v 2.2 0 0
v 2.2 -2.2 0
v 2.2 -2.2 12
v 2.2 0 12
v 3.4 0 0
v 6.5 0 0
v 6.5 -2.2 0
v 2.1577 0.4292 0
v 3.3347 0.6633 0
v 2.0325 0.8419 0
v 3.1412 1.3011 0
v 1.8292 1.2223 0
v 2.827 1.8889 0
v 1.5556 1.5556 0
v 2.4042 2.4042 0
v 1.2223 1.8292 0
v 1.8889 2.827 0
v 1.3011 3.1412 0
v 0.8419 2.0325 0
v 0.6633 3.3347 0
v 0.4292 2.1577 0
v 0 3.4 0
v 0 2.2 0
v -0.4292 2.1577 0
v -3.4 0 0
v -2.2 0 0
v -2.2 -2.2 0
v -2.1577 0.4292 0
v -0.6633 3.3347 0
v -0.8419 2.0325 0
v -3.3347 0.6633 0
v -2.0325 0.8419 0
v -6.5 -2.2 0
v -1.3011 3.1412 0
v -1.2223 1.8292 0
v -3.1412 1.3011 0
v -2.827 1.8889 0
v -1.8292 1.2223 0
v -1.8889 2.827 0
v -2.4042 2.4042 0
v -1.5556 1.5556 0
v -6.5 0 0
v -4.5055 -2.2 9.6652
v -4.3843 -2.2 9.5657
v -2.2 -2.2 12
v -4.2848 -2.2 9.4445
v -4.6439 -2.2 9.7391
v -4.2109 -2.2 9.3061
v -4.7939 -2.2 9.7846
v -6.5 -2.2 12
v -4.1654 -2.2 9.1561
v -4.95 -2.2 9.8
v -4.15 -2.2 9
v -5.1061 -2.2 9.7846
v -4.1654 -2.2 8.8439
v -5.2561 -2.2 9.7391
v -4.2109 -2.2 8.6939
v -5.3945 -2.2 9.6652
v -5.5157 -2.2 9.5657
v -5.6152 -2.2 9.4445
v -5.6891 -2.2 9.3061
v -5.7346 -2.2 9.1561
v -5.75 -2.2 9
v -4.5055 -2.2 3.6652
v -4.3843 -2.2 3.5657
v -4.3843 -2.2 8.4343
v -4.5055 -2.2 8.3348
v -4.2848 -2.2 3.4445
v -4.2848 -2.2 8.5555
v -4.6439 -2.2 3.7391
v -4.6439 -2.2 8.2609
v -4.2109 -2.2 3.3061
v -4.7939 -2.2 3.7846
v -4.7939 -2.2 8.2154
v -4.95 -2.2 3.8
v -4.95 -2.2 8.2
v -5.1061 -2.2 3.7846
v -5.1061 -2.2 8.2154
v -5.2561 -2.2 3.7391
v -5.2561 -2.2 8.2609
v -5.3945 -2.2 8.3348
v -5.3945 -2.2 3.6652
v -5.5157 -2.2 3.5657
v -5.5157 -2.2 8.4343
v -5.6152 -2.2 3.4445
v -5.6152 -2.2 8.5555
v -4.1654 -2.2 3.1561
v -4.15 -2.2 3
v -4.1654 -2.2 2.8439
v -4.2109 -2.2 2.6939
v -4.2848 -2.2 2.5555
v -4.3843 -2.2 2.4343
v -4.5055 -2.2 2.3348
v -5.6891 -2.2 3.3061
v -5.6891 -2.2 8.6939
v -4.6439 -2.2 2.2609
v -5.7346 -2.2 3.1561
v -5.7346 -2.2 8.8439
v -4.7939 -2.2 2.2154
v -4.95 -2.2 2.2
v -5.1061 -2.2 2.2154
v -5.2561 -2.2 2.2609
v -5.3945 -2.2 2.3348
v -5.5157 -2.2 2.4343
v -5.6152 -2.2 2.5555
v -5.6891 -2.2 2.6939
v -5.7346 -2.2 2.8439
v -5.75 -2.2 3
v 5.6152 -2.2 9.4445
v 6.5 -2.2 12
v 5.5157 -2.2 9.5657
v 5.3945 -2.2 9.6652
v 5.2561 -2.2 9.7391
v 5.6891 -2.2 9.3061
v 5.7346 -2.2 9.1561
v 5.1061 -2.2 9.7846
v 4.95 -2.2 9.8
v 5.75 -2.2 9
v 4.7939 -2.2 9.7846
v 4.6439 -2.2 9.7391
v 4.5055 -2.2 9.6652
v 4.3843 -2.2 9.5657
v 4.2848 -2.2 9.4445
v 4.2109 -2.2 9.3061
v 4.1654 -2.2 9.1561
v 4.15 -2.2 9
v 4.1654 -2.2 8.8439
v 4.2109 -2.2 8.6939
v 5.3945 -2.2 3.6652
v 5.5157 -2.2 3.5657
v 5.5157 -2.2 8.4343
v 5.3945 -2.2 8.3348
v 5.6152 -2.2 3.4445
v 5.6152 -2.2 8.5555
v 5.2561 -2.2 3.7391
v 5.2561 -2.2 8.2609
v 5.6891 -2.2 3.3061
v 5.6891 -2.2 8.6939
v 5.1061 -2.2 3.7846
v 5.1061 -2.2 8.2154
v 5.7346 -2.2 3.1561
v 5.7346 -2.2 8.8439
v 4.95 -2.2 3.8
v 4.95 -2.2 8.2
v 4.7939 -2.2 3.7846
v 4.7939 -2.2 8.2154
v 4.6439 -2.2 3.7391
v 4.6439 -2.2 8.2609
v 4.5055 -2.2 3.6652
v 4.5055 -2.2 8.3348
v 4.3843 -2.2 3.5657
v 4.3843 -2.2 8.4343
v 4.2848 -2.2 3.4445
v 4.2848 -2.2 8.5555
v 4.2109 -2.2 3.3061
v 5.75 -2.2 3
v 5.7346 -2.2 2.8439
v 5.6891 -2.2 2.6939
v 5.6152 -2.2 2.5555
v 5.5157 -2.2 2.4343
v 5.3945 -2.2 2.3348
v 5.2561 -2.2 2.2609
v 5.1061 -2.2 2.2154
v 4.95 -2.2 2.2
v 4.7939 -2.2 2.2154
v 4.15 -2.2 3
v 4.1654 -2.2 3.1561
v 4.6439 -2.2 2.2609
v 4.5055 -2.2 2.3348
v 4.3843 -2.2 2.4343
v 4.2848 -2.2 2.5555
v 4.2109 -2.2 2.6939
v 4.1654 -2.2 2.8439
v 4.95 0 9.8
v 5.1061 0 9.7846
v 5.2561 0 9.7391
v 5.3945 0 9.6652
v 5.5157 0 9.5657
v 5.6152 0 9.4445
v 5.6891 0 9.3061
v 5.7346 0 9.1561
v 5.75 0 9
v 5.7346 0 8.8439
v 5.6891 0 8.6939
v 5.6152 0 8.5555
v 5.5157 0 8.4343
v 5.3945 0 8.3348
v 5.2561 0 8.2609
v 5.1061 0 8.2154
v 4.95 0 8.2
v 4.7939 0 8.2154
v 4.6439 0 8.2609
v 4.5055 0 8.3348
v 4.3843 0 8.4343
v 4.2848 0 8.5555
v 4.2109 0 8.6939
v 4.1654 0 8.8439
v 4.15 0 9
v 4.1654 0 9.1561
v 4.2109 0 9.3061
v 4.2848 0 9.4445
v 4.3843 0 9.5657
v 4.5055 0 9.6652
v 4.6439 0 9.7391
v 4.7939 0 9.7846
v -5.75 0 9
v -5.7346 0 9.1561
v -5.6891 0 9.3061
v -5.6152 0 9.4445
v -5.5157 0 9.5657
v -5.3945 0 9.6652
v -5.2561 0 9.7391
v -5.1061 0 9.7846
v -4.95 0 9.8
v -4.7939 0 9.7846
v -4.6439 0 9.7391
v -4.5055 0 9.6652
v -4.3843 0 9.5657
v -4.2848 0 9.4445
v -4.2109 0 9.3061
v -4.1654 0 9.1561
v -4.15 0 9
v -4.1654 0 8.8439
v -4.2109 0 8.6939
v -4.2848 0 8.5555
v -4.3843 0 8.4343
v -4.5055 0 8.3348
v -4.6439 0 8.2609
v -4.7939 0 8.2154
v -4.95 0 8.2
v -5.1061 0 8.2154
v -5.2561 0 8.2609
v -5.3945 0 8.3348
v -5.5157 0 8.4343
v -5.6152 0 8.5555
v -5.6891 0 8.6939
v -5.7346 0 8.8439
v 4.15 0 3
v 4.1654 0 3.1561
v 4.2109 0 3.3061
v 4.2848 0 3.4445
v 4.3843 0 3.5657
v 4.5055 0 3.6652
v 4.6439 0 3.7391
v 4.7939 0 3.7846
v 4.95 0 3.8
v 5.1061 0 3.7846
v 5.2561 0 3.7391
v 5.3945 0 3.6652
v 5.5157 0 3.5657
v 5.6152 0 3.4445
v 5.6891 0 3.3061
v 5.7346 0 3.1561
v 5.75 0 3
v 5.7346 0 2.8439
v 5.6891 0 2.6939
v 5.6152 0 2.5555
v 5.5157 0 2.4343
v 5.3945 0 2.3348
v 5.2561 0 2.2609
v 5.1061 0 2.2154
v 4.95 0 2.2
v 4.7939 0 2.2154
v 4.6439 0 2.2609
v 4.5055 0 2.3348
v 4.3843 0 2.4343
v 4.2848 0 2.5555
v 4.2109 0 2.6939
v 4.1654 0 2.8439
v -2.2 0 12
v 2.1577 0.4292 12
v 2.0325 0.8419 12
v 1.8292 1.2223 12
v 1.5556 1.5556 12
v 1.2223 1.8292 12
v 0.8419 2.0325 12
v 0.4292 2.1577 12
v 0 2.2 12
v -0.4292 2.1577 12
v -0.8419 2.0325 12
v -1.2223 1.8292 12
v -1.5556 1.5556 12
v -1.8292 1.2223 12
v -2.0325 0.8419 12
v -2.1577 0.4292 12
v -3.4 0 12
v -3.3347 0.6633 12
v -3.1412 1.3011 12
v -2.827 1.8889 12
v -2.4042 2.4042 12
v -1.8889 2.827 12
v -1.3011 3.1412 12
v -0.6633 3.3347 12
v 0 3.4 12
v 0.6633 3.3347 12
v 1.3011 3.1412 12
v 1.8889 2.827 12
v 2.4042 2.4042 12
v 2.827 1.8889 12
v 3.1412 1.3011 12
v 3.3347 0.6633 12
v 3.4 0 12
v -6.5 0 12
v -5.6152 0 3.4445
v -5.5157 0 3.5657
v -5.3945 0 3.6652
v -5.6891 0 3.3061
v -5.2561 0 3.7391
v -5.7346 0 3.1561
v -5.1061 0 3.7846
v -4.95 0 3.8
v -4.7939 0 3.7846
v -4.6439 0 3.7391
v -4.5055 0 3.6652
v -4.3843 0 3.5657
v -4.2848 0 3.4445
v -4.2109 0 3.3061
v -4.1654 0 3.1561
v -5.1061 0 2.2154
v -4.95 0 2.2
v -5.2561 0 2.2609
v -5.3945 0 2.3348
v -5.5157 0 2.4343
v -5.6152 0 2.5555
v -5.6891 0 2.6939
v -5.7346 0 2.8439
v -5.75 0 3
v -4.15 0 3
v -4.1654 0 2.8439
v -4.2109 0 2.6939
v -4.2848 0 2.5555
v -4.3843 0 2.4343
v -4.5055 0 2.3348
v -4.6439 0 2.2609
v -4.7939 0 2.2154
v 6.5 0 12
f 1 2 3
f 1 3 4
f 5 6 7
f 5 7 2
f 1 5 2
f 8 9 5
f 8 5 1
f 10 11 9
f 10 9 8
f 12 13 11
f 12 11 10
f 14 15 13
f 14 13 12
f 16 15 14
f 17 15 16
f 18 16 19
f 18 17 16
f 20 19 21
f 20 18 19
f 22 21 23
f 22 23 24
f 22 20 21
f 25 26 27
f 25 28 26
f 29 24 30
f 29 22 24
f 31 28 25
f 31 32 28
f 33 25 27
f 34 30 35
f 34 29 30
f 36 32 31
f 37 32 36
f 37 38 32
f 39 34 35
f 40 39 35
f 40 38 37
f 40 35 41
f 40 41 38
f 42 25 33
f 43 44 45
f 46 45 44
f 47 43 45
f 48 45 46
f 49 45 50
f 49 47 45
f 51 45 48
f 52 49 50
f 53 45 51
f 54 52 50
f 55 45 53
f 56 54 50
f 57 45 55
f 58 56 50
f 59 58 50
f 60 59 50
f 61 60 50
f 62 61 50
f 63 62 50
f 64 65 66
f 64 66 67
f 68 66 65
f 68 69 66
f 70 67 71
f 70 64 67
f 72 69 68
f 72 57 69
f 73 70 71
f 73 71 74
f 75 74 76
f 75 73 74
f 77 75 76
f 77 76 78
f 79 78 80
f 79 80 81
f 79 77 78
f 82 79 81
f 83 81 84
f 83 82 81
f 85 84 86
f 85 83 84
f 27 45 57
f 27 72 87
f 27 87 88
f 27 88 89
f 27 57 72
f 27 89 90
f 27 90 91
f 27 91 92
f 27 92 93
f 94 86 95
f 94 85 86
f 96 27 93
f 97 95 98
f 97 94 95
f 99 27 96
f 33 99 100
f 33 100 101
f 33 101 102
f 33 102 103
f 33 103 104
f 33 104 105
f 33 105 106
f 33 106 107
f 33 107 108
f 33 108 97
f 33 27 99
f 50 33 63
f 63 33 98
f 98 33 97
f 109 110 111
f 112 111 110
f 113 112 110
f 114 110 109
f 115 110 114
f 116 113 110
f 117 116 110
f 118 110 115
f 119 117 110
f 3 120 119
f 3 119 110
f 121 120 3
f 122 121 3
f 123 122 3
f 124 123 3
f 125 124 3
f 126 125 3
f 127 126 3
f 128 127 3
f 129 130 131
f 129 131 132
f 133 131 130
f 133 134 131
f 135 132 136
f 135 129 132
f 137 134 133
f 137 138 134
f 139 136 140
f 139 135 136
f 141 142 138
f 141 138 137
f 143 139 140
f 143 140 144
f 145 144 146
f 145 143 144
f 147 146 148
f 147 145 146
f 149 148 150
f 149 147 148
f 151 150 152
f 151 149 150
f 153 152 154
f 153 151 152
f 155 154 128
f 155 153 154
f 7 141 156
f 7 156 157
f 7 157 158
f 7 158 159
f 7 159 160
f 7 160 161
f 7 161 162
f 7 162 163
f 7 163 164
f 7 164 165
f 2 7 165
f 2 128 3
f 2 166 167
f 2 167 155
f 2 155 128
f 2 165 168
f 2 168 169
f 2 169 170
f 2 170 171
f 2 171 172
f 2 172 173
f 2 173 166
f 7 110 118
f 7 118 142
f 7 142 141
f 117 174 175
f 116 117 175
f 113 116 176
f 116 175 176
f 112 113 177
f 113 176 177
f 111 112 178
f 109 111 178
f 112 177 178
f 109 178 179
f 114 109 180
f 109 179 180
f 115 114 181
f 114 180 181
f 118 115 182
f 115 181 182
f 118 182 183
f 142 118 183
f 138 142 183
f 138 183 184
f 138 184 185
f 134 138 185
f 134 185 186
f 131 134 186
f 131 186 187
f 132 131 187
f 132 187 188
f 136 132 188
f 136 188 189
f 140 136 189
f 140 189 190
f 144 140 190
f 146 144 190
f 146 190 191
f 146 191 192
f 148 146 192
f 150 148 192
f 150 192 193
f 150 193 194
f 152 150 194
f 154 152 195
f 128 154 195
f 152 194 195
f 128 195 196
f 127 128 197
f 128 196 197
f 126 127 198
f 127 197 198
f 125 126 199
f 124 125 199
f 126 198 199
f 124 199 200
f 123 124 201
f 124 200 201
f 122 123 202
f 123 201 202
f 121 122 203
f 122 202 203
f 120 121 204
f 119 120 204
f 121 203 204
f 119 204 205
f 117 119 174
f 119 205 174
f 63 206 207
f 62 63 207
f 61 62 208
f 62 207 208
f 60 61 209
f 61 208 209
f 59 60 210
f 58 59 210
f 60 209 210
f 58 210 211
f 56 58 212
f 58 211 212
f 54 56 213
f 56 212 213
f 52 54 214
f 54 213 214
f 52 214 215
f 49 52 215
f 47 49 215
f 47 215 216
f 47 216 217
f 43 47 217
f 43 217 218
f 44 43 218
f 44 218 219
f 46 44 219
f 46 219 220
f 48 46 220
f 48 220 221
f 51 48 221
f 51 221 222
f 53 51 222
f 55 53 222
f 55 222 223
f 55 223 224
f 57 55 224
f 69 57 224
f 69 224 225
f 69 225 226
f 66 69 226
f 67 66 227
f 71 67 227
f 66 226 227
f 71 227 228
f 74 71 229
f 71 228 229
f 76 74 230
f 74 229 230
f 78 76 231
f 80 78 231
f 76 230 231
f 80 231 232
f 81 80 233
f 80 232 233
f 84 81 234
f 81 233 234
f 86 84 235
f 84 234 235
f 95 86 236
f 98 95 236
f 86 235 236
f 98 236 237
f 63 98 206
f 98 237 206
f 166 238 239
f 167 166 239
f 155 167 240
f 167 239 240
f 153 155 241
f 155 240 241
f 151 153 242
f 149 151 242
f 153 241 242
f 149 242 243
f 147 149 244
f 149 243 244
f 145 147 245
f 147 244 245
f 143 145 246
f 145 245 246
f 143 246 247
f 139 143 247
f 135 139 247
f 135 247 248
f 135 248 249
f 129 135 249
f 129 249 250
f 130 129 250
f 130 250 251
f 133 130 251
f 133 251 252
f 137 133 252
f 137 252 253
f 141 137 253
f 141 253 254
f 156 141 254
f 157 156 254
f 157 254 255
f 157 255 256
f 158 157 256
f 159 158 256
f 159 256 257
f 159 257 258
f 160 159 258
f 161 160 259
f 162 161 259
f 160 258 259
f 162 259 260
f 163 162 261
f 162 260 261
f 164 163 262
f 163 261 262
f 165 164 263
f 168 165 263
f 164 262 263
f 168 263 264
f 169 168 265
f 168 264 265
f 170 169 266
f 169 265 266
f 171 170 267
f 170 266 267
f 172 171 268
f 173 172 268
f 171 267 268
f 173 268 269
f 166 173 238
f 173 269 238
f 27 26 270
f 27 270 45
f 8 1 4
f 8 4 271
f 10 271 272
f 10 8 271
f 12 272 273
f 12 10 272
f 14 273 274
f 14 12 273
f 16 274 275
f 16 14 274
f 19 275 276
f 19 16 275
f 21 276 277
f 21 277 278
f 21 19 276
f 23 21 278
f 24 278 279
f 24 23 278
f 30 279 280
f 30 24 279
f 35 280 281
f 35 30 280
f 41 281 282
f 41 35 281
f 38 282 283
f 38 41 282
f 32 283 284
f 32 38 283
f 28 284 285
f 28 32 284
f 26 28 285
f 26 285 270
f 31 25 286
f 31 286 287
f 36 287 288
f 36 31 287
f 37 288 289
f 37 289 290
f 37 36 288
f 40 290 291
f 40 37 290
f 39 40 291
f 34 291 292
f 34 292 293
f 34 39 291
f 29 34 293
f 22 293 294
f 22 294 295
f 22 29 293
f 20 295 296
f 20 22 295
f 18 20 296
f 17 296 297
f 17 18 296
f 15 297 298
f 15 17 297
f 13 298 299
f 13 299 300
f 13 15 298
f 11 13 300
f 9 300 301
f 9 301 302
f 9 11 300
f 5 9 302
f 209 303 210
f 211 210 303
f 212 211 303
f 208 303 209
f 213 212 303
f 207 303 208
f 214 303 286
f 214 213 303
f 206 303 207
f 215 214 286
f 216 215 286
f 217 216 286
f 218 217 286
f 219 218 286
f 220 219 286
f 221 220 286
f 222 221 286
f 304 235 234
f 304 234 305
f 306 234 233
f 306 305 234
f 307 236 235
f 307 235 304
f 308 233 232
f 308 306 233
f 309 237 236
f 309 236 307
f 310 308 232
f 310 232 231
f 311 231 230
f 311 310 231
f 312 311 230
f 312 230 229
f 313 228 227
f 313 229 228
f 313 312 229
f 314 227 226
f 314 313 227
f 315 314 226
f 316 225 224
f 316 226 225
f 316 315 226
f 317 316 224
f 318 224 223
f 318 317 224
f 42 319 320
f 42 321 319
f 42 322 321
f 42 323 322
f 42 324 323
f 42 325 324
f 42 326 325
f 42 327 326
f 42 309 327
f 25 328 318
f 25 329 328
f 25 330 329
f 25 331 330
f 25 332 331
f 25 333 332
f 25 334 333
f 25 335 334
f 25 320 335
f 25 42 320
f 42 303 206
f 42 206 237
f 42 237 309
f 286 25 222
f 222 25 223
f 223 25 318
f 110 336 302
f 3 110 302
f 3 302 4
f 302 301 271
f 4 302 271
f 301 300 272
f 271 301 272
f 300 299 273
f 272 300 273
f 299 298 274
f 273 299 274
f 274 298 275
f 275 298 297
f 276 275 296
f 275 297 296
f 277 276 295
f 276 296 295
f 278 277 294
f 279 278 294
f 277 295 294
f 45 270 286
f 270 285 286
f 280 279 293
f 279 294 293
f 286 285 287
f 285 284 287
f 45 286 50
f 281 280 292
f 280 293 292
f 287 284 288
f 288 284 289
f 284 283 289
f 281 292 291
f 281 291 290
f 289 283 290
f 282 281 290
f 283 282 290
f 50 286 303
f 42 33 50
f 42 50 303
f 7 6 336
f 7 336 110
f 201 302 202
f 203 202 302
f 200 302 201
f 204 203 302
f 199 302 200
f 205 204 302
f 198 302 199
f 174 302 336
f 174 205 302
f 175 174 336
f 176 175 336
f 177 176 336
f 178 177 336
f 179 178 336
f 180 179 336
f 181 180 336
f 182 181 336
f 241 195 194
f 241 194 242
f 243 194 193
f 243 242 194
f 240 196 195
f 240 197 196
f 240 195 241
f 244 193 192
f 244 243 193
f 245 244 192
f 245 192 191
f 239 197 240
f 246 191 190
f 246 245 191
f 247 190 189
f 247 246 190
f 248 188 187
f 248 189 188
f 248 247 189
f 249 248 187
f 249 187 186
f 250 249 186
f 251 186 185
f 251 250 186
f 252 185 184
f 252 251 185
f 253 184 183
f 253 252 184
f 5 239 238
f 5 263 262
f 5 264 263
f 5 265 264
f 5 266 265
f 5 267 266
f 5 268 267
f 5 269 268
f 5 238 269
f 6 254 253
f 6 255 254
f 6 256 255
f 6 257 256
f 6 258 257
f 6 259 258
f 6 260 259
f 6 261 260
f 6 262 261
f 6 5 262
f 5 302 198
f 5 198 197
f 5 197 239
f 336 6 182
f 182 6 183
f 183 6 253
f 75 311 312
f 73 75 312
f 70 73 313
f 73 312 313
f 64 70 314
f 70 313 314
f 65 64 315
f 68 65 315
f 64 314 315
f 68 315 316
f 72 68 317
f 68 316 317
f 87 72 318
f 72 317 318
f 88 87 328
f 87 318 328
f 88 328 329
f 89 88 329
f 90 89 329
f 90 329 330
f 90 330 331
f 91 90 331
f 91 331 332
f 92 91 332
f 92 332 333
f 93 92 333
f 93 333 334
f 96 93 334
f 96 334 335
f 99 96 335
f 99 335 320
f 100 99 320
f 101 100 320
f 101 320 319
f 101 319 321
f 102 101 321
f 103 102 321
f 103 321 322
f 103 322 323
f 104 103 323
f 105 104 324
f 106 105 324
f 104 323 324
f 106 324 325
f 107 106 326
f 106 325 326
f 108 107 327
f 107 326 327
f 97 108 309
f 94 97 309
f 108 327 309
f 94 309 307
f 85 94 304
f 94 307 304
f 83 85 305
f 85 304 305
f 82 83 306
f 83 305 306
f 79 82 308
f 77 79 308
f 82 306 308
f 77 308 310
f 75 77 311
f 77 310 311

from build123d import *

# Parameters (mm, degrees)
BOSS_EXTRUDE1_DEPTH = 12
SKETCH2_R           = 0.8
CUT_EXTRUDE1_DEPTH  = 20


with BuildPart() as part:
    # Sketch1 → Boss-Extrude1 (new body)
    with BuildSketch(Plane.XY):
        with BuildLine():
            Line((-2.2, 0), (-2.2, -2.2))
            Line((-2.2, -2.2), (-6.5, -2.2))
            Line((-6.5, -2.2), (-6.5, 0))
            Line((-6.5, 0), (-3.4, 0))
            ThreePointArc((-3.4, 0), (0, 3.4), (3.4, 0))
            Line((3.4, 0), (6.5, 0))
            Line((6.5, 0), (6.5, -2.2))
            Line((6.5, -2.2), (2.2, -2.2))
            Line((2.2, -2.2), (2.2, 0))
            ThreePointArc((2.2, 0), (0, 2.2), (-2.2, 0))
        make_face()
    extrude(amount=BOSS_EXTRUDE1_DEPTH)

    # Sketch2 → Cut-Extrude1 (cut)
    with BuildSketch(Plane(origin=(0, 0, 0), x_dir=(1, 0, 0), z_dir=(0, 1, 0))):
        with Locations(Location((-4.95, -3, 0), (0, 0, 270))):
            Circle(SKETCH2_R)
        with Locations(Location((-4.95, -9, 0), (0, 0, 180))):
            Circle(SKETCH2_R)
        with Locations(Location((4.95, -3, 0), (0, 0, 180))):
            Circle(SKETCH2_R)
        with Locations(Location((4.95, -9, 0), (0, 0, 270))):
            Circle(SKETCH2_R)
    extrude(amount=-CUT_EXTRUDE1_DEPTH, mode=Mode.SUBTRACT)


solid = part.part
